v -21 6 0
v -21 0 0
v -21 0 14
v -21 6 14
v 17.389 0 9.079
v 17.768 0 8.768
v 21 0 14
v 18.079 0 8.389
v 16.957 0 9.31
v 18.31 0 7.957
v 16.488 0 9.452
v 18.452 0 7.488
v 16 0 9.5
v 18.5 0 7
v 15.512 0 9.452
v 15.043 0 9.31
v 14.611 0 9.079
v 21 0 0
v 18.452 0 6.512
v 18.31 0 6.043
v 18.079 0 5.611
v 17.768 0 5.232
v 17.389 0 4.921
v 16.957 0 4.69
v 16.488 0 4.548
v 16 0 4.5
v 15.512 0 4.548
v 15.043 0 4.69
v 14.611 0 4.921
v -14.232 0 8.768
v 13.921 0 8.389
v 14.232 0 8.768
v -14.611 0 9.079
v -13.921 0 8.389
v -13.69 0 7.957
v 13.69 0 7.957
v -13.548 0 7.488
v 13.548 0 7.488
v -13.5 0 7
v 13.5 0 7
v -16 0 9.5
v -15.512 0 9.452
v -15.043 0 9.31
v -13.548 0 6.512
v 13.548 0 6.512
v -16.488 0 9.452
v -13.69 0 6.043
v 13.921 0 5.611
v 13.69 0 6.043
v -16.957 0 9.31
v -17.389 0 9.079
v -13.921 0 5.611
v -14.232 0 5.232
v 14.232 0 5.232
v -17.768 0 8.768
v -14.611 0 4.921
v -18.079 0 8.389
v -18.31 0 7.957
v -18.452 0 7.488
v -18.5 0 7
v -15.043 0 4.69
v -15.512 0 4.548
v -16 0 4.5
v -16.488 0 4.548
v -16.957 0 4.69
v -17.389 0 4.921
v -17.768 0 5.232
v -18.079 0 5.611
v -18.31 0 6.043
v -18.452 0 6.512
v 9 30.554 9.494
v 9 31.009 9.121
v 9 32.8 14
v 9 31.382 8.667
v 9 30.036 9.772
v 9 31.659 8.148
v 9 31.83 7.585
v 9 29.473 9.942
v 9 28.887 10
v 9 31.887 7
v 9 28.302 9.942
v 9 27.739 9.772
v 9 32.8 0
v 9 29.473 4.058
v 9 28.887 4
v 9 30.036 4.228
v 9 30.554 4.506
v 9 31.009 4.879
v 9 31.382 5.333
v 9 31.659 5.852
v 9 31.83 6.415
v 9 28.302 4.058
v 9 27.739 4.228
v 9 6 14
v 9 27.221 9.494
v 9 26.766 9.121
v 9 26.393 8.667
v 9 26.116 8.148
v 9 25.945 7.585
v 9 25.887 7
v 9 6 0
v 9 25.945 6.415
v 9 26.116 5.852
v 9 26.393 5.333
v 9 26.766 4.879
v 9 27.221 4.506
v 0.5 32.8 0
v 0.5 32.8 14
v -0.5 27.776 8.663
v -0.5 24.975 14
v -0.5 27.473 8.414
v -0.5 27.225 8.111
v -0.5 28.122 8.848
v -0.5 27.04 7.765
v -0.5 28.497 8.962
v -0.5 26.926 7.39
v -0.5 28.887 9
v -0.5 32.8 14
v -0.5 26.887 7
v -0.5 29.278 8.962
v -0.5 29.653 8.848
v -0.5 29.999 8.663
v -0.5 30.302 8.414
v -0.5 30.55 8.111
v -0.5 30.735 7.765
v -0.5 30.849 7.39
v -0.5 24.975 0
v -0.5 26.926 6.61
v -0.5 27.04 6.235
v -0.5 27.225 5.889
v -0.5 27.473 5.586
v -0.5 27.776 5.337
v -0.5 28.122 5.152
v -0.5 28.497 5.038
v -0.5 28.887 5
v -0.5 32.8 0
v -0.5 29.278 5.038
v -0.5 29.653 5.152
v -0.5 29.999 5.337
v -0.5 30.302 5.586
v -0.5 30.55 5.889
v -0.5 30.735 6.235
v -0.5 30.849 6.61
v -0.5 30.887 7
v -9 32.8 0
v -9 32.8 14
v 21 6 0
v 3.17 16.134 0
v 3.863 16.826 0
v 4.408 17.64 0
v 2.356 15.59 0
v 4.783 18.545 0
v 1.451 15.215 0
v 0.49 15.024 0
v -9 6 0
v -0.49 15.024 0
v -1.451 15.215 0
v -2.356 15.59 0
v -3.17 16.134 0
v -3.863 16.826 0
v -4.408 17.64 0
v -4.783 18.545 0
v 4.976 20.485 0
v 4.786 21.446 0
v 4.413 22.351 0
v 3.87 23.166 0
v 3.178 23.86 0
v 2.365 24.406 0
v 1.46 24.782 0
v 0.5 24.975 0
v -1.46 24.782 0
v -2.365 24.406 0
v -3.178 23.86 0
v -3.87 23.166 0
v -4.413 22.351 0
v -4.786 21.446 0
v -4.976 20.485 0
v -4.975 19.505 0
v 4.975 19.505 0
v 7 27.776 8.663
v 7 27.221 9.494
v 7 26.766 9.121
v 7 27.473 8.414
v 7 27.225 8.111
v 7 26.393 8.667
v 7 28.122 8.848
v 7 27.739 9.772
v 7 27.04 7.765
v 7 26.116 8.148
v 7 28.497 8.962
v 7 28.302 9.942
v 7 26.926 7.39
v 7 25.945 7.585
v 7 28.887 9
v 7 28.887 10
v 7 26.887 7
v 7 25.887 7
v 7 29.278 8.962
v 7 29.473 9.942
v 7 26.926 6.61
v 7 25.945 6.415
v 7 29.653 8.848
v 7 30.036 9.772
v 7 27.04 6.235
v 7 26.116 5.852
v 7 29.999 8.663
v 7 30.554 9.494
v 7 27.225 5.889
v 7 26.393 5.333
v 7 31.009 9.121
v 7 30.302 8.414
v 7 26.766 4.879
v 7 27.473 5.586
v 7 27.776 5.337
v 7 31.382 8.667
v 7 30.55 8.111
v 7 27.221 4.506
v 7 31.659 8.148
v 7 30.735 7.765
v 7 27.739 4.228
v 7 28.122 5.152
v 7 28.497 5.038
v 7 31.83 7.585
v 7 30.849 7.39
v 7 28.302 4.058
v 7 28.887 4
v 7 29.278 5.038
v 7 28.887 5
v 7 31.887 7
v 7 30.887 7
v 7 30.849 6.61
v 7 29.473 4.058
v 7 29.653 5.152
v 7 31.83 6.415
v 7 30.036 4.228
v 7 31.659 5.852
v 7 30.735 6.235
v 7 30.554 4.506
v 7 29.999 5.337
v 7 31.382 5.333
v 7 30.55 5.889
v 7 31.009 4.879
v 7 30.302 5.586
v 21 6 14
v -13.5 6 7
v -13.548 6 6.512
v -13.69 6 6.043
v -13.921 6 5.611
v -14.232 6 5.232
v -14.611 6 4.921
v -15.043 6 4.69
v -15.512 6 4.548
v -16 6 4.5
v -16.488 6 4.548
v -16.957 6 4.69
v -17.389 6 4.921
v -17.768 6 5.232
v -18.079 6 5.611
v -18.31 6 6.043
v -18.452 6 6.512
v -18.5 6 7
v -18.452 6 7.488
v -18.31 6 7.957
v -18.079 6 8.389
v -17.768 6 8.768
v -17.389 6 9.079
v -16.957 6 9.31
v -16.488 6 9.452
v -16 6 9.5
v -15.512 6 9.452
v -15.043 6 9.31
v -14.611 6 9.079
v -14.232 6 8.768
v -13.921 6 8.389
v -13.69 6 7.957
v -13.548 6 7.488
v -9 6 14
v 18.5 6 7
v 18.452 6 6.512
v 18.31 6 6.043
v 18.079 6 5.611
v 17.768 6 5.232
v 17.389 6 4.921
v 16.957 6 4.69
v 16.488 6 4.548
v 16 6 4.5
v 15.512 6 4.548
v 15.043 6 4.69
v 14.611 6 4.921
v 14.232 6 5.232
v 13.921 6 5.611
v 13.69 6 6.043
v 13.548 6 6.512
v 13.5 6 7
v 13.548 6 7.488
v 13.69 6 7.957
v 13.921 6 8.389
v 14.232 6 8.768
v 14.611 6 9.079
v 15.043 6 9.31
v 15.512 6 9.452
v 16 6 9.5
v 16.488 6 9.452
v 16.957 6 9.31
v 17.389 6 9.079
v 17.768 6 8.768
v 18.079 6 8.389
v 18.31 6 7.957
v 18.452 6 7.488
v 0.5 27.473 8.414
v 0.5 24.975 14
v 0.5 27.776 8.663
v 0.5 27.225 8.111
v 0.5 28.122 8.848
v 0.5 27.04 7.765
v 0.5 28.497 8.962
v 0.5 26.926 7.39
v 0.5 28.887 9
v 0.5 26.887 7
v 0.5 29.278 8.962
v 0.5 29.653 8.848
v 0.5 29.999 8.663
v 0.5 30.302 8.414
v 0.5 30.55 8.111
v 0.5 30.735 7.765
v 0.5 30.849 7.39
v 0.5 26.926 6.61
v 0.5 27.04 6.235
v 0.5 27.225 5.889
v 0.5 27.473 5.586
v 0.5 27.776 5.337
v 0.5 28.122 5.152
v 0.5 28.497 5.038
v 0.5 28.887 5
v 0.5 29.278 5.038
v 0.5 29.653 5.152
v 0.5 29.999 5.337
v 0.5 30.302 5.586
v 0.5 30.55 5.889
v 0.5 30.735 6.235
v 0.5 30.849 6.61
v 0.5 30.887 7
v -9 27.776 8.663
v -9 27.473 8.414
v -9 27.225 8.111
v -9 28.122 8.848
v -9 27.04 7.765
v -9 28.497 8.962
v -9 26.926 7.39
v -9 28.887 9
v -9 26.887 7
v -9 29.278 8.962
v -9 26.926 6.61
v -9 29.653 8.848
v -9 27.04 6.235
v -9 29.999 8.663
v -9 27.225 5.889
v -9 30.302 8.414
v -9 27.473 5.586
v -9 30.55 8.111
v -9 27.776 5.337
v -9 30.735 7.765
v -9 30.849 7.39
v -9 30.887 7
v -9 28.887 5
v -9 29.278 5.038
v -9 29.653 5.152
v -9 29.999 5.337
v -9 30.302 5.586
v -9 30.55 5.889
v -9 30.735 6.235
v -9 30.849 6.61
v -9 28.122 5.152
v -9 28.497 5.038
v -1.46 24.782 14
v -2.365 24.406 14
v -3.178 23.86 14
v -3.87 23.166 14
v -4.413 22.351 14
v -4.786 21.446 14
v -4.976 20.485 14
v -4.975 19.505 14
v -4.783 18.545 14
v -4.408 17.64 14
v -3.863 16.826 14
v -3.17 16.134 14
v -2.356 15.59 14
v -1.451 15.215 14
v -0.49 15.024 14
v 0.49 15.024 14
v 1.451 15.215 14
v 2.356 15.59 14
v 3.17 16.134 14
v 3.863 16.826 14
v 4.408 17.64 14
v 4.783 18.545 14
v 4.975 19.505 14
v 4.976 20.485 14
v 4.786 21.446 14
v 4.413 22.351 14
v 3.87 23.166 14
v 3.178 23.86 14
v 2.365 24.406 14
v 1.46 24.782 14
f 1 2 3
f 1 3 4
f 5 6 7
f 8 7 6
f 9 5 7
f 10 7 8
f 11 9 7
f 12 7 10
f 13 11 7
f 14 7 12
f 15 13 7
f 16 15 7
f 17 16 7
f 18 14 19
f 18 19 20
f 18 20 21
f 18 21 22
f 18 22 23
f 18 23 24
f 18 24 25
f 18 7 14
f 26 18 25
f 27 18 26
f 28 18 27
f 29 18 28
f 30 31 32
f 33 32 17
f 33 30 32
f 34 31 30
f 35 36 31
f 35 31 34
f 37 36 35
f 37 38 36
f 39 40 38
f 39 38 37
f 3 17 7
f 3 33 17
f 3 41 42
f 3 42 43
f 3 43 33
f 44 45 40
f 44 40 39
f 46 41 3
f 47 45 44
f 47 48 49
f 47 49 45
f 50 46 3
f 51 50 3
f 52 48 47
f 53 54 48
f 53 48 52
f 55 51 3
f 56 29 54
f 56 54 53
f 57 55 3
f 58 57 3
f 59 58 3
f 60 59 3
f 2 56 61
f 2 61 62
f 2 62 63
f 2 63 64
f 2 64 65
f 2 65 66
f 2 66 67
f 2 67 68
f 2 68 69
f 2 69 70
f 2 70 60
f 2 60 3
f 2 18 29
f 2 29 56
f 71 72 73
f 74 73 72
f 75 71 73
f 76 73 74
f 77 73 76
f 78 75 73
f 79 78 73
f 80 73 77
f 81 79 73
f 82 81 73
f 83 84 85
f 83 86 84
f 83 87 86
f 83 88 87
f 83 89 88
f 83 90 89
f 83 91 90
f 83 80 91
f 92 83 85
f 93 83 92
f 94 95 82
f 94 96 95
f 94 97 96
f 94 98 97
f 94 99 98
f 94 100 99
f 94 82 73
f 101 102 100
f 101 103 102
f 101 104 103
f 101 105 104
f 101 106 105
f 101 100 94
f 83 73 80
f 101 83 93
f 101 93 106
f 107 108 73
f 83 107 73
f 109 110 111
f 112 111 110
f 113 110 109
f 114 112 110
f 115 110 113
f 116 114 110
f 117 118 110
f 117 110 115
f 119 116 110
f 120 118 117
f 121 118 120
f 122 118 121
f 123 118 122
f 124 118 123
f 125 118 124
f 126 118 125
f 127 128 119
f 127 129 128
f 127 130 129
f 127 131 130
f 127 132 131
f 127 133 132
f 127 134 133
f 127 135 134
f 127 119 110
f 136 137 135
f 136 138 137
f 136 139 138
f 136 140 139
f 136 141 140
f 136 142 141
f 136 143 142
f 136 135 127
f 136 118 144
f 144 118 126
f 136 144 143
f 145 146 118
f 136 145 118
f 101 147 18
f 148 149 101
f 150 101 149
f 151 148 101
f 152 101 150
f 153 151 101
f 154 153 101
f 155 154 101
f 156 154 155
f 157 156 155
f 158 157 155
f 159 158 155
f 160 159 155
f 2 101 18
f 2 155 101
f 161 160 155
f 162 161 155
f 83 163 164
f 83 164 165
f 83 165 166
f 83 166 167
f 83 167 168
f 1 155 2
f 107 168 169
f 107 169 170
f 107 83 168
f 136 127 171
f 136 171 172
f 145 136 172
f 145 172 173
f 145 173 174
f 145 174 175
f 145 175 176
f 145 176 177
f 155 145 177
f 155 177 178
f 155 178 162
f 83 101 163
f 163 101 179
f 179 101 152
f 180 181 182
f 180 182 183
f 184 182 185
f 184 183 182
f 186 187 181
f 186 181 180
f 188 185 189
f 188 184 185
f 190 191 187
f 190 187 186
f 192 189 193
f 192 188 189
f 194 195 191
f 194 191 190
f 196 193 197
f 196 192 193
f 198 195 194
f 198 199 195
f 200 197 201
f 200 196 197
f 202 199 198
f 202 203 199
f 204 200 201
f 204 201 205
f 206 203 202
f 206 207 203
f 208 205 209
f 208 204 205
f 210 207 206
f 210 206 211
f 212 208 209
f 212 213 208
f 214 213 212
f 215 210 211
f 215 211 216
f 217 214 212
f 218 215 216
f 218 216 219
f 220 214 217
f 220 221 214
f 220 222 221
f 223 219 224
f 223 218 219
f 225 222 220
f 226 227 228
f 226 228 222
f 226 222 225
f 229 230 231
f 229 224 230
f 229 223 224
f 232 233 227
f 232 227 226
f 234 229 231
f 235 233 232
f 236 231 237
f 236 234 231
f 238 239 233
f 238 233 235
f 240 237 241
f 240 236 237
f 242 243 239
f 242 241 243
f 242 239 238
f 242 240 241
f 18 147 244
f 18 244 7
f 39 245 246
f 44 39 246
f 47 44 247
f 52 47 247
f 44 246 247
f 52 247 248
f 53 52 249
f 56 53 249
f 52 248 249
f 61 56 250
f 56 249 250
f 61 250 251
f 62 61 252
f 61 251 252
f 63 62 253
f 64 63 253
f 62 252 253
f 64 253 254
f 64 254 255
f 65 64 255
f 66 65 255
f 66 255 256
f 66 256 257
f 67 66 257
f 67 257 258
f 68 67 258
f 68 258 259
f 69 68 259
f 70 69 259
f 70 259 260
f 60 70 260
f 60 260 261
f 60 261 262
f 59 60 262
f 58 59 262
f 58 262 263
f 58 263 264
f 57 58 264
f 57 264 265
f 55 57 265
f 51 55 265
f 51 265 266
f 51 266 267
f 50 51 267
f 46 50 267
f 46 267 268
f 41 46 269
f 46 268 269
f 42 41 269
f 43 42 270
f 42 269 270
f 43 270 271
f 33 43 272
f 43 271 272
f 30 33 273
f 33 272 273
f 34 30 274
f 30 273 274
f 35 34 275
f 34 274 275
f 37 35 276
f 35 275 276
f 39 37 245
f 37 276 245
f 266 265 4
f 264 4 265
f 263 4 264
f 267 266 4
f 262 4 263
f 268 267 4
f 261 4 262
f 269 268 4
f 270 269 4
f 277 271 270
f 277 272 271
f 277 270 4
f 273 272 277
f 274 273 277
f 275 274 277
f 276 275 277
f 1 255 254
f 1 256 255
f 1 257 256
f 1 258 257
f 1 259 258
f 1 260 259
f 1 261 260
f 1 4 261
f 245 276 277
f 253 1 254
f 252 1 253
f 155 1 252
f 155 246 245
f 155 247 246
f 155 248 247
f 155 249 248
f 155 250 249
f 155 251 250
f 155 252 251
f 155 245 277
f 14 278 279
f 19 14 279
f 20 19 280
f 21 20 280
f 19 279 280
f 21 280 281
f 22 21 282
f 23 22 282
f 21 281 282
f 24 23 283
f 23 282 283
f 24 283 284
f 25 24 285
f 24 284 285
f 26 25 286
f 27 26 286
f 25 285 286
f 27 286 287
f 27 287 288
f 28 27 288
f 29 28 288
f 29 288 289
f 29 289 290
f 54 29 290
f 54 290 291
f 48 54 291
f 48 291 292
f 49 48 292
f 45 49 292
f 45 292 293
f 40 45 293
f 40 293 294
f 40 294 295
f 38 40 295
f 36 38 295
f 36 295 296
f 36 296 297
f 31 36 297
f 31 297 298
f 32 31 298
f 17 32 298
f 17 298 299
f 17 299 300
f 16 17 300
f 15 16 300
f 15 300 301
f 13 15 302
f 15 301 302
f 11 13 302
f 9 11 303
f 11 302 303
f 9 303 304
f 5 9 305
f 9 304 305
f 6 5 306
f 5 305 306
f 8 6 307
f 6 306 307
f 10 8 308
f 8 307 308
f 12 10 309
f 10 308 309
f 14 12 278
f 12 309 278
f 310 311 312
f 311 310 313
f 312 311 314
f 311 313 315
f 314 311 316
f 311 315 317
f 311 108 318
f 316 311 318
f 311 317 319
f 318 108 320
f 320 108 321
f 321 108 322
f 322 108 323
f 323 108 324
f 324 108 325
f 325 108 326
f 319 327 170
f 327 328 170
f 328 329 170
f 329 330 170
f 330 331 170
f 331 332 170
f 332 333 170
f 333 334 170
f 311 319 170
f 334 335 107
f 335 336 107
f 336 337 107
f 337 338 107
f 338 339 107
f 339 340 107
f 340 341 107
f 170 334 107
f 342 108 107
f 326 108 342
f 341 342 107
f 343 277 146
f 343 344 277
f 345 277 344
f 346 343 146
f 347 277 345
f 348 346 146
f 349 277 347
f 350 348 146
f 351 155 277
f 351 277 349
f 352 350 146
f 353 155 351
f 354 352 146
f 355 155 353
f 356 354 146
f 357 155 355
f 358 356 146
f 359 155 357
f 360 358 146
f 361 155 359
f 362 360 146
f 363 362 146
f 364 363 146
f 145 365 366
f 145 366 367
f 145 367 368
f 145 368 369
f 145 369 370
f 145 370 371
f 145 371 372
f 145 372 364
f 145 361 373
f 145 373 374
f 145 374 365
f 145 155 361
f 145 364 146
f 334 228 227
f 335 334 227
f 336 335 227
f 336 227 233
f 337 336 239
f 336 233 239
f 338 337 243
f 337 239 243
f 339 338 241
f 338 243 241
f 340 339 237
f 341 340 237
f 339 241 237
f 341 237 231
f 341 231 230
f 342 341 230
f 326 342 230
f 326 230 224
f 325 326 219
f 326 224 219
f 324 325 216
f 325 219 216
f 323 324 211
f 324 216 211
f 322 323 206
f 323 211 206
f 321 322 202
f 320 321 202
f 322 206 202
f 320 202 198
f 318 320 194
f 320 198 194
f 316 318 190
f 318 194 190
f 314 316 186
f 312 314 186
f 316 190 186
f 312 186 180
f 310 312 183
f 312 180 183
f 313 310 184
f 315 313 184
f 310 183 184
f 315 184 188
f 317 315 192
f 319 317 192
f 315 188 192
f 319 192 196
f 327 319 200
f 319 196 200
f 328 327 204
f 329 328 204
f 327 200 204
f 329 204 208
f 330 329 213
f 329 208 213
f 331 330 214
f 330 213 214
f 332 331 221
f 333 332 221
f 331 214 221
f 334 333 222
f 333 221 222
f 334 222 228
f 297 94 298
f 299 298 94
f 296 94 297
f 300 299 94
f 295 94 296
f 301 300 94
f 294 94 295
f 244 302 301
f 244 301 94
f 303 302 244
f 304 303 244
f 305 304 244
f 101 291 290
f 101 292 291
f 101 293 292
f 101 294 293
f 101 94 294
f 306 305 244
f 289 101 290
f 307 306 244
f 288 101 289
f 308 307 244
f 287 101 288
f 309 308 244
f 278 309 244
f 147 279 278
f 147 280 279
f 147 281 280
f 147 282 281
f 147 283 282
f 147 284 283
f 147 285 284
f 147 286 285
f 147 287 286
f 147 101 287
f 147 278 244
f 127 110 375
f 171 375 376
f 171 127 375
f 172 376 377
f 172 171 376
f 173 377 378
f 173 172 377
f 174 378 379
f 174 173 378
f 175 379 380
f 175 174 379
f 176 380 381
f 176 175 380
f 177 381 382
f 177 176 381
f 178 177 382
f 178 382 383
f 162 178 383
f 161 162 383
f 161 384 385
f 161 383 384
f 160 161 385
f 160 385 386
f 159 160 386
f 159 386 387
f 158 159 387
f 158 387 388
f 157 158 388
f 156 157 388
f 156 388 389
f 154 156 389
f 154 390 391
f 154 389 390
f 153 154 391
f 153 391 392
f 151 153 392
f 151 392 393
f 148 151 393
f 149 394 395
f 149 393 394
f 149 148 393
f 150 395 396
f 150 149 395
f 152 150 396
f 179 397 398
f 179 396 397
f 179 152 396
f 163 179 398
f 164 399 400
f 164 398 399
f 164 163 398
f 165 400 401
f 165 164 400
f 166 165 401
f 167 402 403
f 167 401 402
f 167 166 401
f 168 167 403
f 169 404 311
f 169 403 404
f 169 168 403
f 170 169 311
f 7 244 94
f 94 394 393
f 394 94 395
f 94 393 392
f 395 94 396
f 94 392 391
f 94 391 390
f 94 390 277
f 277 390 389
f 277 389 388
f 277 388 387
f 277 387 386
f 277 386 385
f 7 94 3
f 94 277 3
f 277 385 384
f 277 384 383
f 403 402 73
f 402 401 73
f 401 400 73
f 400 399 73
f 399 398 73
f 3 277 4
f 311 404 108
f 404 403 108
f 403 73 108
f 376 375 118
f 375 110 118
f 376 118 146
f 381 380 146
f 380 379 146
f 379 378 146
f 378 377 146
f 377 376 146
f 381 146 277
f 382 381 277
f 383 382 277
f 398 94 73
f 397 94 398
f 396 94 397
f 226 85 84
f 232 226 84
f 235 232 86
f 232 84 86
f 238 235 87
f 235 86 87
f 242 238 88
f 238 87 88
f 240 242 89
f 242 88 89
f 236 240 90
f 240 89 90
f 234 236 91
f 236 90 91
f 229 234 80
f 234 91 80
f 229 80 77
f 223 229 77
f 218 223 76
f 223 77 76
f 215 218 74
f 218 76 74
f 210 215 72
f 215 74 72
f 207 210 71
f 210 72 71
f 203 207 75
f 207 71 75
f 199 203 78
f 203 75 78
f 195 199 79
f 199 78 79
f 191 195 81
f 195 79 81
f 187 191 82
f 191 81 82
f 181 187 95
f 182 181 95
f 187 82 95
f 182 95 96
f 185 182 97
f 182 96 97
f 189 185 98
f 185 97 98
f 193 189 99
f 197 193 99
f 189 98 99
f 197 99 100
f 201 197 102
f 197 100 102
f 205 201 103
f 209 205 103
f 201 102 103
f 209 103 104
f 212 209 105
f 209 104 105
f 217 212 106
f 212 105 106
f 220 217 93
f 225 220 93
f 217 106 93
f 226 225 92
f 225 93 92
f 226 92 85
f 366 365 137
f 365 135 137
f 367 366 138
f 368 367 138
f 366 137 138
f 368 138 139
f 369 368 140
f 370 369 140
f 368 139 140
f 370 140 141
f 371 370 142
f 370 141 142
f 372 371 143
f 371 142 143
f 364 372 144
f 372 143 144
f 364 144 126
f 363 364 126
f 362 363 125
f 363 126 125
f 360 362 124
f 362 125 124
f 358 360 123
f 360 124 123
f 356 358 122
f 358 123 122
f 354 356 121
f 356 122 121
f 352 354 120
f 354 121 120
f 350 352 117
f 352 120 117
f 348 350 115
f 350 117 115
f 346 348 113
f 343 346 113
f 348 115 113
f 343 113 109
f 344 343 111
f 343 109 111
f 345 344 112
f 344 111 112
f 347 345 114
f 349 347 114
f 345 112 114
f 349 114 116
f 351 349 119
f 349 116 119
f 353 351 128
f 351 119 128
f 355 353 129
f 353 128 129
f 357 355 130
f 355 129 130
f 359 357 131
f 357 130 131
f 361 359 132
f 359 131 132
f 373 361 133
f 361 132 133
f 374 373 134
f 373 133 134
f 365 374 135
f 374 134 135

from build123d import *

# Parameters (mm, degrees)
SKETCH_1_R          = 5
EXTRUDE_1_DEPTH     = 14
SKETCH_2_R          = 2.5
CUT_EXTRUDE_1_DEPTH = 7
SKETCH_3_W          = 1
SKETCH_3_H          = 14
CUT_EXTRUDE_2_DEPTH = 14
SKETCH_4_R          = 2
CUT_EXTRUDE_3_DEPTH = 10
SKETCH_5_R          = 3
CUT_EXTRUDE_4_DEPTH = 2


with BuildPart() as part:
    # 草图1 → 凸台-拉伸1 (new body)
    with BuildSketch(Plane.XY):
        Polygon((21, 0), (-21, 0), (-21, 6), (-9, 6), (-9, 32.8), (9, 32.8), (9, 6), (21, 6), align=None)
        with Locations((0, 20)):
            Circle(SKETCH_1_R, mode=Mode.SUBTRACT)
    extrude(amount=EXTRUDE_1_DEPTH)

    # 草图2 → 切除-拉伸1 (cut, through all)
    with BuildSketch(Plane(origin=(0, 6, 0), x_dir=(1, 0, 0), z_dir=(0, 1, 0))):
        with Locations((-16, -7)):
            Circle(SKETCH_2_R)
        with Locations((16, -7)):
            Circle(SKETCH_2_R)
    extrude(amount=-CUT_EXTRUDE_1_DEPTH, mode=Mode.SUBTRACT)

    # 草图3 → 切除-拉伸2 (cut)
    with BuildSketch(Plane(origin=(0, 32.8, 0), x_dir=(1, 0, 0), z_dir=(0, 1, 0))):
        with Locations((0, -7)):
            Rectangle(SKETCH_3_W, SKETCH_3_H)
    extrude(amount=-CUT_EXTRUDE_2_DEPTH, mode=Mode.SUBTRACT)

    # 草图4 → 切除-拉伸3 (cut, symmetric)
    with BuildSketch(Plane(origin=(-0.5, 0, 0), x_dir=(0, 0, -1), z_dir=(1, 0, 0))):
        with Locations((-7, 28.887468593)):
            Circle(SKETCH_4_R)
    extrude(amount=CUT_EXTRUDE_3_DEPTH, both=True, mode=Mode.SUBTRACT)

    # 草图5 → 切除-拉伸4 (cut)
    with BuildSketch(Plane(origin=(9, 0, 0), x_dir=(0, 0, -1), z_dir=(1, 0, 0))):
        with Locations((-7, 28.887468593)):
            Circle(SKETCH_5_R)
    extrude(amount=-CUT_EXTRUDE_4_DEPTH, mode=Mode.SUBTRACT)


solid = part.part
